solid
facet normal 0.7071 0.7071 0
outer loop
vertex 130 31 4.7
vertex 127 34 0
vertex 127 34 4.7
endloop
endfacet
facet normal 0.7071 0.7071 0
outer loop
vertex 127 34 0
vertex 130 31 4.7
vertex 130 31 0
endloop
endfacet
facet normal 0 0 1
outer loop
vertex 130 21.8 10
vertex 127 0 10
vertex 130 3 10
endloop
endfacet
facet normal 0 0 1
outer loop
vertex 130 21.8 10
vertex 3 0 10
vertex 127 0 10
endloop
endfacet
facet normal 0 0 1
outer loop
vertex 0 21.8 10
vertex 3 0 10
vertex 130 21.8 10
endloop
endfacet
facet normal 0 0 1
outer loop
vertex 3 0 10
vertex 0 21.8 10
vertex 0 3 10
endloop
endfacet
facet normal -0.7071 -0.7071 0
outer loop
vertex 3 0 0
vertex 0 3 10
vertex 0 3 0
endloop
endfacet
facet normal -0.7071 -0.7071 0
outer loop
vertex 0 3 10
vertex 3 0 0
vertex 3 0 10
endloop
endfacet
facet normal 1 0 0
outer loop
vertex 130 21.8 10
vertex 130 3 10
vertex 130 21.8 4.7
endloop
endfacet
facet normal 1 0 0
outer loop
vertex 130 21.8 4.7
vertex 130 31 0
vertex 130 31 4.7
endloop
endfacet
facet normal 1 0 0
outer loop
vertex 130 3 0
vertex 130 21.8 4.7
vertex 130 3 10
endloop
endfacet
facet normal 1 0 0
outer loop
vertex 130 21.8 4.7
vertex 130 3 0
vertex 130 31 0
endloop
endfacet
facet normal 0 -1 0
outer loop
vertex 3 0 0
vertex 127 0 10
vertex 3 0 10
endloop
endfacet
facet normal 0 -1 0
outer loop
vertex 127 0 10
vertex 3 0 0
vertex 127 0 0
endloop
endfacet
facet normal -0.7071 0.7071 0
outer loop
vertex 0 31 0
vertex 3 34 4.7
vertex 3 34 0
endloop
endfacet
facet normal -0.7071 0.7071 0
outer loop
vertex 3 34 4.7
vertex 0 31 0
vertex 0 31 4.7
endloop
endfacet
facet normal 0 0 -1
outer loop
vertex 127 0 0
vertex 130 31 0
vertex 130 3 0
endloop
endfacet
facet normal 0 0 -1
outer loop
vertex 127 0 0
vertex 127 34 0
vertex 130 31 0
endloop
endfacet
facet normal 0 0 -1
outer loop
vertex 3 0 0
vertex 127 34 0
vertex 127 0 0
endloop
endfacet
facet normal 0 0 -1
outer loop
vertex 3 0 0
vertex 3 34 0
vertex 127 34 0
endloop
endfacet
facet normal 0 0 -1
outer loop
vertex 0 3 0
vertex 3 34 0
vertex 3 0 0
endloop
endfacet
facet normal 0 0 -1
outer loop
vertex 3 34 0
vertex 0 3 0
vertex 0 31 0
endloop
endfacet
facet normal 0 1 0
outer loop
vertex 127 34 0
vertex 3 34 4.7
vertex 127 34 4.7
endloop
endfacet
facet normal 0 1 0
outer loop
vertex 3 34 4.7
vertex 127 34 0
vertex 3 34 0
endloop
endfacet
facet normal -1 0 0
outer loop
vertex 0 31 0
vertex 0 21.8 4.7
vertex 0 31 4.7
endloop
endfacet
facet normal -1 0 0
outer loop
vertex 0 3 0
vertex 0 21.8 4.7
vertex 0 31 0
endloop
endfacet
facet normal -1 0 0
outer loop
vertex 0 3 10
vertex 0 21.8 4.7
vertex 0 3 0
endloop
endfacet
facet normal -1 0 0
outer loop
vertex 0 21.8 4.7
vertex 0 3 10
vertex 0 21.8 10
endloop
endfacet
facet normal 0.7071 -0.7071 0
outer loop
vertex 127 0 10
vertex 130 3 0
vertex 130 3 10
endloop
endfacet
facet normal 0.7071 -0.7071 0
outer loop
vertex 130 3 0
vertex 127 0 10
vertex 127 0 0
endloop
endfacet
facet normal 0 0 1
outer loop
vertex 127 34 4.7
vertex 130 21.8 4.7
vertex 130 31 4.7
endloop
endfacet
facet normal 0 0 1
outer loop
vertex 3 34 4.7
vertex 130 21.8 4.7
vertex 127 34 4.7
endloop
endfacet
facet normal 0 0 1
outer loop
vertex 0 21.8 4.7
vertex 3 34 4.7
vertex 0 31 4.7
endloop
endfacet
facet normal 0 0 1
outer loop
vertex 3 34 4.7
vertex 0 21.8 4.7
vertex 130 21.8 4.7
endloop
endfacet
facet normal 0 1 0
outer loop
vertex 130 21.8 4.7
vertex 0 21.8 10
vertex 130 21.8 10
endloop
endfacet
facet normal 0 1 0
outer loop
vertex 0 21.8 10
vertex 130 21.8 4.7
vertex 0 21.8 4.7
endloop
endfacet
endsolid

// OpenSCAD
$fn = 32;

// ----------------------------------------------------------------------
// Stepped bar: sidestep, 130 x 34 x 10/4.7 mm
// ----------------------------------------------------------------------

// --- parameters (mm) ---
bar_l = 130;              // bar length, X
bar_w = 34;               // bar width, Y
plate_t = 10;             // thickness of the thick zone, Z
thin_t = 4.7;             // thickness of the thin zone
corner_c = 3;             // corner chamfer of the bar
step_cut = 5.3;           // material removed from the thin zone
ledge_y = 21.8;           // start of the ledge from the front edge
depth_1 = 5.3;            // depth of cut 1 from the top face

profile = [[3, 0], [127, 0], [130, 3], [130, 31], [127, 34], [3, 34], [0, 31], [0, 3]];  // primary outline, 8 points, counter clockwise
void_1 = [[-1, 21.8], [131, 21.8], [131, 35], [-1, 35]];  // ledge cut along one edge, 4 points

// --- the one profile operation ---
difference() {
  linear_extrude(height = plate_t) polygon(points = profile);
  translate([0, 0, plate_t - depth_1])
    linear_extrude(height = depth_1 + 1) polygon(points = void_1);
}
